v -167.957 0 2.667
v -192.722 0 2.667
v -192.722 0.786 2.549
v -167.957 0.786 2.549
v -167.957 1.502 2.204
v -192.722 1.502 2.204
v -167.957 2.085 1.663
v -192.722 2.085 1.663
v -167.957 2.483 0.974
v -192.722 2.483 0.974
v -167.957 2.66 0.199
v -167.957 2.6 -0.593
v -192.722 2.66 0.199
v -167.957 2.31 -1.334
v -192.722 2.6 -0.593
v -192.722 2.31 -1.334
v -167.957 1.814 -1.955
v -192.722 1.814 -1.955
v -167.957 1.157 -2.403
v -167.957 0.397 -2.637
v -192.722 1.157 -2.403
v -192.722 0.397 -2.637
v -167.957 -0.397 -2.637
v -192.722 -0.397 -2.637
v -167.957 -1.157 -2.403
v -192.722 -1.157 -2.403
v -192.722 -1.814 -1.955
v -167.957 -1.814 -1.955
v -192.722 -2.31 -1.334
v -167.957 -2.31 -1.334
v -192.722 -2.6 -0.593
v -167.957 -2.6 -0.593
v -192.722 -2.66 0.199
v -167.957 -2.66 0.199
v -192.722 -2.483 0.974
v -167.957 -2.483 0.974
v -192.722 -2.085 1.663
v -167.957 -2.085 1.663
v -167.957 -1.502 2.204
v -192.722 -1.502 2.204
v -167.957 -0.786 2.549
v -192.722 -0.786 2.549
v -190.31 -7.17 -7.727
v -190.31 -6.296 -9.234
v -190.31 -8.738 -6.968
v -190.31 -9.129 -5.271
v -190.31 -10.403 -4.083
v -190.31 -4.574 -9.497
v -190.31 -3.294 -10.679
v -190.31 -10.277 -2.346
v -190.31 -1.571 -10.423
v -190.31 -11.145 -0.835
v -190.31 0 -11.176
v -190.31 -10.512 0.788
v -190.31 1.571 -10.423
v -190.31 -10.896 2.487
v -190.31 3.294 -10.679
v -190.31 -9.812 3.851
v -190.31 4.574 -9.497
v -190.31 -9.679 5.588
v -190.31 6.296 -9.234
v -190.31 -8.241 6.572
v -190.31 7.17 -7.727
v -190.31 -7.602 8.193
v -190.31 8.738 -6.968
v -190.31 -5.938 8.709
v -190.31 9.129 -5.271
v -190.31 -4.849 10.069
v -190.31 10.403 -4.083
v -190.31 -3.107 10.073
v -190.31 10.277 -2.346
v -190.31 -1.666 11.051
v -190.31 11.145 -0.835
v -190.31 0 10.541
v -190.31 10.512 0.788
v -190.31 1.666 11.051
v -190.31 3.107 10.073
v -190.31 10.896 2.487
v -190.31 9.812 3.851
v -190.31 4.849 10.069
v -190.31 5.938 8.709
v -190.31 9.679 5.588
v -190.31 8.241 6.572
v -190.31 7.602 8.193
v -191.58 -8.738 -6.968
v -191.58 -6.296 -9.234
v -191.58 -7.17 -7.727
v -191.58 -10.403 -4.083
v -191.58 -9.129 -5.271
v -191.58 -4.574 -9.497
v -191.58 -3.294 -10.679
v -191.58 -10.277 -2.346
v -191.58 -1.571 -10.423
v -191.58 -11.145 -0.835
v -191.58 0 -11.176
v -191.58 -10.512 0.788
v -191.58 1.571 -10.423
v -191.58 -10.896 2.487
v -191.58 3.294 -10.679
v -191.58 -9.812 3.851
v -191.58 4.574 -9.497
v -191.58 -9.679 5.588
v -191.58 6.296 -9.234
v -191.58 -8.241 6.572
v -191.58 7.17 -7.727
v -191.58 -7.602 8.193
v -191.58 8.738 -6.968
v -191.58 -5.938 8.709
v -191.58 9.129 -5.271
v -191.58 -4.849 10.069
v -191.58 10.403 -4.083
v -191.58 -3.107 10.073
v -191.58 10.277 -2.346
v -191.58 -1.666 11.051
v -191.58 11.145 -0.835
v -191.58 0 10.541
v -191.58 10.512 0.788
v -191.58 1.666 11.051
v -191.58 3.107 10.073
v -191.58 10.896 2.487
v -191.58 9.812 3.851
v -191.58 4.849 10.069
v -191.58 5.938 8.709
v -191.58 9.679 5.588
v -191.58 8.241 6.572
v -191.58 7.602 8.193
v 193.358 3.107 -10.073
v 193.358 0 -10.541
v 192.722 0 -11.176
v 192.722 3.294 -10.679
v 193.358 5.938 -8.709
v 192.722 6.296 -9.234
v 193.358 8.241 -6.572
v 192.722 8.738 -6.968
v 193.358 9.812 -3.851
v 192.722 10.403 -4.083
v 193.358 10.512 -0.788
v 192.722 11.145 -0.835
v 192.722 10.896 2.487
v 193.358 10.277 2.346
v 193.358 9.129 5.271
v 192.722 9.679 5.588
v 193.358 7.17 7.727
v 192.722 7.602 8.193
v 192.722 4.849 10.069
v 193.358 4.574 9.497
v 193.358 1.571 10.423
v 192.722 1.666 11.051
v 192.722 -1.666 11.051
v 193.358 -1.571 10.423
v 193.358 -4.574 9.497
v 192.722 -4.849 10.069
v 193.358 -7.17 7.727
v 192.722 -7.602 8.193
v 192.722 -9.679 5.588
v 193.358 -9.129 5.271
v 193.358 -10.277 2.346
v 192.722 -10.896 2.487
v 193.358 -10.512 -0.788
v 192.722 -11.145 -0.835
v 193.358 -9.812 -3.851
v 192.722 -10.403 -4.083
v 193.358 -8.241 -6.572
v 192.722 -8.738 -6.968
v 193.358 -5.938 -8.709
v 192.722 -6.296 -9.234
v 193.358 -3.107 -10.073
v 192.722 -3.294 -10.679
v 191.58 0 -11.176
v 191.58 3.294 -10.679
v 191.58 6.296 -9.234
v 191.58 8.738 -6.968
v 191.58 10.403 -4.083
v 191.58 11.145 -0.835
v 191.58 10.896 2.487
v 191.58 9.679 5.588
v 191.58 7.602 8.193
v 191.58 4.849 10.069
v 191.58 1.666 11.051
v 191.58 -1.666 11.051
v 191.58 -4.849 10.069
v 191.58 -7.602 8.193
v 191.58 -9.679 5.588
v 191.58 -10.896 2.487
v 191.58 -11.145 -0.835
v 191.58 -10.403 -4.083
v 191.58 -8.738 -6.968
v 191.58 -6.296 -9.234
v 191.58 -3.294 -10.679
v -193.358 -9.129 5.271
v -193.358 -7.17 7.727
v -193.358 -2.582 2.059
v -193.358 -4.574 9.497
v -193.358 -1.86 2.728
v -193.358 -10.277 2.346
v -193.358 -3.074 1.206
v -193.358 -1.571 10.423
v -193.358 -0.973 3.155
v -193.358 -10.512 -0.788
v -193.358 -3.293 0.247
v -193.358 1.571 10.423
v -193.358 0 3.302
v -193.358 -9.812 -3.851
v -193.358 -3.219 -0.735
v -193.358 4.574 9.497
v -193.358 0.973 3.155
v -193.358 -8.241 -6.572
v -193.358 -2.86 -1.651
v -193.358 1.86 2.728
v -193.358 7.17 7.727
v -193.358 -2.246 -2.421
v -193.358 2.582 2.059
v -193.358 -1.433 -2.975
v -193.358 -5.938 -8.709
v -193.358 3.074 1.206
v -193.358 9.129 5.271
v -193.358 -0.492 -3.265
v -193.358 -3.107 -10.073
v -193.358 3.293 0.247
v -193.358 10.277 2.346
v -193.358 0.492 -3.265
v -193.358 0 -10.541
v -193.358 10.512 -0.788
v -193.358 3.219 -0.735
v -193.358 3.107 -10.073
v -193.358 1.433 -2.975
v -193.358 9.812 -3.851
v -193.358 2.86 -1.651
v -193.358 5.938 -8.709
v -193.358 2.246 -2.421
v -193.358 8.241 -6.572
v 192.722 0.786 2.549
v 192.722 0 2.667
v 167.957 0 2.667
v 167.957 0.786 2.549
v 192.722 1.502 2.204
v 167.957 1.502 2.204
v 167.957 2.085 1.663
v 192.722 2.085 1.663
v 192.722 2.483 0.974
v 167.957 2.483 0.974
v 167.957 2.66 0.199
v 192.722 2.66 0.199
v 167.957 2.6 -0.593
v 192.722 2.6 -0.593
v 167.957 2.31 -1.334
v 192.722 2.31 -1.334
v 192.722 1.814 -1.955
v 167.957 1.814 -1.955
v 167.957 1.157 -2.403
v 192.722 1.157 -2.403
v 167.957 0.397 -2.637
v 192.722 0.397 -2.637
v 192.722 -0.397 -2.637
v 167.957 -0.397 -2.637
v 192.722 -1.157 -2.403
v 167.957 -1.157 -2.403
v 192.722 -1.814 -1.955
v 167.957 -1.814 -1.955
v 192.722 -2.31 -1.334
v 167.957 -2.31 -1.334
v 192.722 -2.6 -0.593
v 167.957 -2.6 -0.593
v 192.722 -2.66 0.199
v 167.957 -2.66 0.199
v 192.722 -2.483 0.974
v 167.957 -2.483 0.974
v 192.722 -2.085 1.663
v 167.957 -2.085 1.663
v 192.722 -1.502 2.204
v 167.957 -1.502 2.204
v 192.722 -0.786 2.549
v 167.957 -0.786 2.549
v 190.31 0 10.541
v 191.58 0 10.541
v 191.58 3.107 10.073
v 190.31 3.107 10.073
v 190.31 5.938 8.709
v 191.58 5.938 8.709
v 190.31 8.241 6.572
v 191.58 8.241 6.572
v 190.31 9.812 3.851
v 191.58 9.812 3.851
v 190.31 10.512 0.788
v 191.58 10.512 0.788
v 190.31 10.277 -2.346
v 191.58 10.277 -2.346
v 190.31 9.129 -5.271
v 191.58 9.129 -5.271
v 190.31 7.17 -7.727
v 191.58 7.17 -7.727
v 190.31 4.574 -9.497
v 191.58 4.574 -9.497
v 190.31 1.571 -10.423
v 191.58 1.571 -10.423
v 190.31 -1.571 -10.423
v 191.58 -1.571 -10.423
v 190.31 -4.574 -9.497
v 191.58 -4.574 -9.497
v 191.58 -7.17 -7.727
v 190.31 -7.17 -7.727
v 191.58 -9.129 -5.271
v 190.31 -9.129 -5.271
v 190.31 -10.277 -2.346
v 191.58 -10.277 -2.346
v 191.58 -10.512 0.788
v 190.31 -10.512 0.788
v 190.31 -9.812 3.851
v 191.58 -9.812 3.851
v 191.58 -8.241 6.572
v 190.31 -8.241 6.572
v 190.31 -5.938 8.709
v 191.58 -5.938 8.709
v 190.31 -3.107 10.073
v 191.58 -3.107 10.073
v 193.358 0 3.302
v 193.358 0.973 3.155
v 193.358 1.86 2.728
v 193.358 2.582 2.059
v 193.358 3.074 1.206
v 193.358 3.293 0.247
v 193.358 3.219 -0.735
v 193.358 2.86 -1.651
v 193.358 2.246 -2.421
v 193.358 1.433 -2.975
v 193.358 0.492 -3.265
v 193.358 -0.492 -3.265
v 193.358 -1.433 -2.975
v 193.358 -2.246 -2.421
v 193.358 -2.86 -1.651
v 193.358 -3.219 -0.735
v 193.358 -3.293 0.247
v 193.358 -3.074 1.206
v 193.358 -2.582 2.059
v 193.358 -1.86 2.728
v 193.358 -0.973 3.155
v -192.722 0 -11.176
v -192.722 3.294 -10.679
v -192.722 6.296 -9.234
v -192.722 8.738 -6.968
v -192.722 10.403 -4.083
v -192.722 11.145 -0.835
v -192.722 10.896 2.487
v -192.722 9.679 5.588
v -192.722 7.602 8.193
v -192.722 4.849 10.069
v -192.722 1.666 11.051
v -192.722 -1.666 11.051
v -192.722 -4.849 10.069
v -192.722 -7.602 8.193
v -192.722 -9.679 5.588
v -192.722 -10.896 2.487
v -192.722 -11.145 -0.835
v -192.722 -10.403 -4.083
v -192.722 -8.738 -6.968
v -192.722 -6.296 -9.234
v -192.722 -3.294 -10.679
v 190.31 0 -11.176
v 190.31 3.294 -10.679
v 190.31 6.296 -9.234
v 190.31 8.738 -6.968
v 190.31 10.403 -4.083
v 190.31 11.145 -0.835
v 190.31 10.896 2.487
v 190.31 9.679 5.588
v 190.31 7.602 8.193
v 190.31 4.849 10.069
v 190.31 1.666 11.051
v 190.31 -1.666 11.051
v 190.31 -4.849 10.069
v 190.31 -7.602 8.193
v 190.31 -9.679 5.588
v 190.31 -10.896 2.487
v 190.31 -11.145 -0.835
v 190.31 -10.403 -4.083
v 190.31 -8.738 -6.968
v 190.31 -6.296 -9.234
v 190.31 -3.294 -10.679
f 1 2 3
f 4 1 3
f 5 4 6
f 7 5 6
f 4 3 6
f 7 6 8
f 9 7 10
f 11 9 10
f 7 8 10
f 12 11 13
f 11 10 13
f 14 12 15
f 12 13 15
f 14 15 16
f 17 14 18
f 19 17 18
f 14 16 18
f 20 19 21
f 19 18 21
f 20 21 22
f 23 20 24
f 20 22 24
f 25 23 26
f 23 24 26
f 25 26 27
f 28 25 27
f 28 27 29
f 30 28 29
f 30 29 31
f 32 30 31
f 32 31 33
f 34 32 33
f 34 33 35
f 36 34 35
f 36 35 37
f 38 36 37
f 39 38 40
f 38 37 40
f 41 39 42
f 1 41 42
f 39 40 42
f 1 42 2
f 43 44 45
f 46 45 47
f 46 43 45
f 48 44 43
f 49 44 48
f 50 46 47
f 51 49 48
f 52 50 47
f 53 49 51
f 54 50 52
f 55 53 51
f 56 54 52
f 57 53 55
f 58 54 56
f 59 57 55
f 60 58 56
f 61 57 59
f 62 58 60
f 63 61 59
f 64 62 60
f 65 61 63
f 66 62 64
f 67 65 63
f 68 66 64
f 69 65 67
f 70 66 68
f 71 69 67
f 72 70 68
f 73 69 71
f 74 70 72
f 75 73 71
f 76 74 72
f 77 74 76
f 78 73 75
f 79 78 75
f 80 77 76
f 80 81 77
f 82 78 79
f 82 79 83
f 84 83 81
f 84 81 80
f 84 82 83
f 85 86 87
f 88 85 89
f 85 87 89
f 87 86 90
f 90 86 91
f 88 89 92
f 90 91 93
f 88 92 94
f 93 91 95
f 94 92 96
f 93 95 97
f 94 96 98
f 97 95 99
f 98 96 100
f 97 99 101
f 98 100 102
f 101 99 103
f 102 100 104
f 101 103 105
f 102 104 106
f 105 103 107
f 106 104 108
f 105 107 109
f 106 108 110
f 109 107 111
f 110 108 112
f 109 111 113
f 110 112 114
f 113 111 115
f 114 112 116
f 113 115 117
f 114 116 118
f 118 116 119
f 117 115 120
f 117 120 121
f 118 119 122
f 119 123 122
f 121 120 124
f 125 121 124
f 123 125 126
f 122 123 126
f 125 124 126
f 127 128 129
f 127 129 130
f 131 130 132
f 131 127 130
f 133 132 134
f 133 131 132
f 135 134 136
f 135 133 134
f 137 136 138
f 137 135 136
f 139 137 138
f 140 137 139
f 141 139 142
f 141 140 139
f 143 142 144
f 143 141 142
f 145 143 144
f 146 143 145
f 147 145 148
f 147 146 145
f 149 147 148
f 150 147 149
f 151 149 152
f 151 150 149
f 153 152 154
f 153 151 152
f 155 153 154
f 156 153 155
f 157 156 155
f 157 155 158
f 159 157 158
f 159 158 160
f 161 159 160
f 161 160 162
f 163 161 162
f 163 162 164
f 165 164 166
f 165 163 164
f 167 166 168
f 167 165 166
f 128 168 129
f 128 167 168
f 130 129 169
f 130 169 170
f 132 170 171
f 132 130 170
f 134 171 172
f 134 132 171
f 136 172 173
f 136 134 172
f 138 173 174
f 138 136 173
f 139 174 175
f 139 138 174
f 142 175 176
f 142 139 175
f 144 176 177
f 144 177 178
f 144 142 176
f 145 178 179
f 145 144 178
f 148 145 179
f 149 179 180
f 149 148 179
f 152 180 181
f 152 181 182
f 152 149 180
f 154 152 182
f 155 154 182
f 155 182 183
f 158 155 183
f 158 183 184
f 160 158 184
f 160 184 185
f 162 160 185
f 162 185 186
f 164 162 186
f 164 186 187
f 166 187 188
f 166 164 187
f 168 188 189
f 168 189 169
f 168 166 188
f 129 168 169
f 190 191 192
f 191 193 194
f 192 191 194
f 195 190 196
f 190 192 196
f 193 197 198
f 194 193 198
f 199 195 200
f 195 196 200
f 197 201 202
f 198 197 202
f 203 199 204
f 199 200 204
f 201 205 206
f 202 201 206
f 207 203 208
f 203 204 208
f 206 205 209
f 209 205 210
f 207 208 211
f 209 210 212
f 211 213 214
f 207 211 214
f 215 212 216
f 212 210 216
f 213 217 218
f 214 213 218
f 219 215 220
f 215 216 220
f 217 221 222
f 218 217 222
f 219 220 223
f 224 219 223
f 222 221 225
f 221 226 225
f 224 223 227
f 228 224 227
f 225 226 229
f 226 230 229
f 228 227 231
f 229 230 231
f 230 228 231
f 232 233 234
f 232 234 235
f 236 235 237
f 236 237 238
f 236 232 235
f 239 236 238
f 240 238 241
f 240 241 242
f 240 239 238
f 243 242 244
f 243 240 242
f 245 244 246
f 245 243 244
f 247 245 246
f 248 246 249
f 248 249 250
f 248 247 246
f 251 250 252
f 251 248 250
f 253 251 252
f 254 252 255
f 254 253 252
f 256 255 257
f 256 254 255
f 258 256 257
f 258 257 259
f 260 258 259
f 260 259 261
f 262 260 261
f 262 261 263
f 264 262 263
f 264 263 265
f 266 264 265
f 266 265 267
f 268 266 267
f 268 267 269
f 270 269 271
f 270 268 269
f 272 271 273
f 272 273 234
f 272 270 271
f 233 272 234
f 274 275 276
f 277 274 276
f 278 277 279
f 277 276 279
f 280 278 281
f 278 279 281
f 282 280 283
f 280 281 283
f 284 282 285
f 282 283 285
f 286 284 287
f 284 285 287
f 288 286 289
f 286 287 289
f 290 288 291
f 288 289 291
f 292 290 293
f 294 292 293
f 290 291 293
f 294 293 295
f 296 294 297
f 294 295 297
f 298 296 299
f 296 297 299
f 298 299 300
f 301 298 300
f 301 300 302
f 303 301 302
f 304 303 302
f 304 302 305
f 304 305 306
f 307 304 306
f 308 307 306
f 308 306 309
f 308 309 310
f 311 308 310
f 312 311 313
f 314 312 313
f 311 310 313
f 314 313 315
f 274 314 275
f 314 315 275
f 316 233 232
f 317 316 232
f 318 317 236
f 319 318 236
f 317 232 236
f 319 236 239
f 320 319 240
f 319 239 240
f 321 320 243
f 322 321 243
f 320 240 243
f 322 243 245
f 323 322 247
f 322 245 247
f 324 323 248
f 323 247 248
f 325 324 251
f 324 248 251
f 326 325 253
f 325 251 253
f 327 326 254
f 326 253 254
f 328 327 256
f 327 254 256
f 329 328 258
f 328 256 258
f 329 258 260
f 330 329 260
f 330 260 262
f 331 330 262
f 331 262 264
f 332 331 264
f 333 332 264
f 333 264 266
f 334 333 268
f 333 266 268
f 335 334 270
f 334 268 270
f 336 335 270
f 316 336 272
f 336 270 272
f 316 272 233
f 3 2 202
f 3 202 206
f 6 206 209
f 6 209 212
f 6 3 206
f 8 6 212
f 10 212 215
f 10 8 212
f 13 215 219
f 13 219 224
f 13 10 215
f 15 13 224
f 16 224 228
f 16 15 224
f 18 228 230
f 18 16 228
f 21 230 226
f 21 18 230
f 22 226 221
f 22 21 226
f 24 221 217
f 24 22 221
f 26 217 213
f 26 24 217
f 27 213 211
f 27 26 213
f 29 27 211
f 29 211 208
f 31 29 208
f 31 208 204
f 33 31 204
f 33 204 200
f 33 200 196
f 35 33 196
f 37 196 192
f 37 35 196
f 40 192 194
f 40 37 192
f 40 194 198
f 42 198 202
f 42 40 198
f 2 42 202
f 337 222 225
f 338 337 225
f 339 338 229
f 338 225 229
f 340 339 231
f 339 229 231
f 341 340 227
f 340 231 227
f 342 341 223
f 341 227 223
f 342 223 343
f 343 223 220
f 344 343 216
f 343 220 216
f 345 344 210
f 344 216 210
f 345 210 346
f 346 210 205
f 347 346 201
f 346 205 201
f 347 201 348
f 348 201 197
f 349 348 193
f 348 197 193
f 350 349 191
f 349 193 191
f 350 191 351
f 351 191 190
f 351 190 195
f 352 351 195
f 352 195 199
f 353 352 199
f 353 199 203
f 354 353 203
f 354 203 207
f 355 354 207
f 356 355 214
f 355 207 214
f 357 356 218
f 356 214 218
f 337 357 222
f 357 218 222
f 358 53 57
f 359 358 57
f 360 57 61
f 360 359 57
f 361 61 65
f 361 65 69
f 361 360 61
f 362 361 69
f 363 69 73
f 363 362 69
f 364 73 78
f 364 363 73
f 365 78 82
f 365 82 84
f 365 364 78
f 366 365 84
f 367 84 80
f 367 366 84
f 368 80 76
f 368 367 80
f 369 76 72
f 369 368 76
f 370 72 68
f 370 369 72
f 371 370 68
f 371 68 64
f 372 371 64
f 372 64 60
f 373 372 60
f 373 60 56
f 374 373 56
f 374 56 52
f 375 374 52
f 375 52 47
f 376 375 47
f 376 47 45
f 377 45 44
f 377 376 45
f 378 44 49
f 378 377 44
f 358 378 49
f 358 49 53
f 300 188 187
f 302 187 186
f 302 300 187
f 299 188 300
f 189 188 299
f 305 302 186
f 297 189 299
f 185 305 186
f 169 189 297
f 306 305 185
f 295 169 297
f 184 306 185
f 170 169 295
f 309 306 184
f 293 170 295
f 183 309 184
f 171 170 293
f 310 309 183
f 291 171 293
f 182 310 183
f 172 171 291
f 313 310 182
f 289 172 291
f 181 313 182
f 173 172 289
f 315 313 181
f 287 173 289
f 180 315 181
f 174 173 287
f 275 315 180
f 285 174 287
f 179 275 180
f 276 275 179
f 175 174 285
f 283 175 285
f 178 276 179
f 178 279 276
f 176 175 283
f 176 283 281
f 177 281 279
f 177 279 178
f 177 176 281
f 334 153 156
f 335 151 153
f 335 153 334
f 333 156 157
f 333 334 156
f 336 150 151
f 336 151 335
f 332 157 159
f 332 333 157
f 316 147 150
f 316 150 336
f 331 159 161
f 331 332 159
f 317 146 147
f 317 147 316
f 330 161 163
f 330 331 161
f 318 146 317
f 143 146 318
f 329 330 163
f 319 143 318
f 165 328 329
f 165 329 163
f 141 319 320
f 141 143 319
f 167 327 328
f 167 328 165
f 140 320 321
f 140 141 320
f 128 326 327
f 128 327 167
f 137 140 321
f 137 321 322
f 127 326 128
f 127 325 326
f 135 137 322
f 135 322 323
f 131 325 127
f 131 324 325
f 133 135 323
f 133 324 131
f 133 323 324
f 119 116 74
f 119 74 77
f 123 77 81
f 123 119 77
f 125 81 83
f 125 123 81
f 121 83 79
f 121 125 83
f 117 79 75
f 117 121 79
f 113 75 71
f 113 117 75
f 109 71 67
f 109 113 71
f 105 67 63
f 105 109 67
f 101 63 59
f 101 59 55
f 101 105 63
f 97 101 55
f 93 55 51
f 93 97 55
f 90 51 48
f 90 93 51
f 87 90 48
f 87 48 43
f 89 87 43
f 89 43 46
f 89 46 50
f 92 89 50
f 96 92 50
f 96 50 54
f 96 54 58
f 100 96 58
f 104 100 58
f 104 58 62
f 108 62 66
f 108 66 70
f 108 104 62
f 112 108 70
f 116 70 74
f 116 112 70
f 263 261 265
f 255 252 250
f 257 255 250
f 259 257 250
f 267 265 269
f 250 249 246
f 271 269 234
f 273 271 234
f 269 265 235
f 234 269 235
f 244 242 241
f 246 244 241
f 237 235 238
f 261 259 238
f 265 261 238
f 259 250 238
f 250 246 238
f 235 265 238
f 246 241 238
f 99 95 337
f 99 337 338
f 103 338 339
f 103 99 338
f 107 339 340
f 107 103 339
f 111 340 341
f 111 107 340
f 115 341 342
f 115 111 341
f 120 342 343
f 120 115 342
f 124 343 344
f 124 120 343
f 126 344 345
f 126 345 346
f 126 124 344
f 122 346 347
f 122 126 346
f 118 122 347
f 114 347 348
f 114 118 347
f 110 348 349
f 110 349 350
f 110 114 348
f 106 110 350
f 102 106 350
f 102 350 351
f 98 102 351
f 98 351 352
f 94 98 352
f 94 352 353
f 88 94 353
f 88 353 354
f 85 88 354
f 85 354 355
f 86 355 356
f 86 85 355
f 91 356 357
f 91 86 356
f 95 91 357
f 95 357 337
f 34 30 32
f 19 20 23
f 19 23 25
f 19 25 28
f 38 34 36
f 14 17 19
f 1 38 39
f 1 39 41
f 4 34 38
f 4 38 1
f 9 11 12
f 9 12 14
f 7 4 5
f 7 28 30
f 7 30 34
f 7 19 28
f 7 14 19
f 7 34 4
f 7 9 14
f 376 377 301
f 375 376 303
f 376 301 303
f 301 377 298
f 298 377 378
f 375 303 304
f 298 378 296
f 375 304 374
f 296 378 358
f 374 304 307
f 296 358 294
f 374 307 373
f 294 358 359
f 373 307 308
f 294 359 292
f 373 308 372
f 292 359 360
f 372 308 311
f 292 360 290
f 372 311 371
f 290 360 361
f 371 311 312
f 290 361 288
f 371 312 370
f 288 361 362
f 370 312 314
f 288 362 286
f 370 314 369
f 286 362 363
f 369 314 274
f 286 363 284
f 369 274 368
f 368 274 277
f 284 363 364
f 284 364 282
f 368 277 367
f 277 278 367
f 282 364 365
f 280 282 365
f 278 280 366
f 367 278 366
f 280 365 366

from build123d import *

# Parameters (mm, degrees)
SKETCH1_R           = 11.176
BOSS_EXTRUDE1_DEPTH = 193.3575
CUT_EXTRUDE1_START  = -1.778
SKETCH2_OUTSIDE_W   = 101.952
SKETCH2_OUTSIDE_H   = 101.952
SKETCH2_OUTSIDE_R   = 10.541
CUT_EXTRUDE1_DEPTH  = 1.27
SKETCH3_R           = 2.667
CUT_EXTRUDE2_DEPTH  = 25.4
CHAMFER1_SIZE       = 0.635


with BuildPart() as part:
    # Sketch1 → Boss-Extrude1 (new, symmetric)
    with BuildSketch(Plane(origin=(0, 0, 0), x_dir=(0, 0, -1), z_dir=(1, 0, 0))):
        Circle(SKETCH1_R)
    extrude(amount=BOSS_EXTRUDE1_DEPTH, both=True)

    # Sketch2 outside → Cut-Extrude1 (cut)
    with BuildSketch(Plane.ZY.offset(193.3575).offset(CUT_EXTRUDE1_START)):
        Rectangle(SKETCH2_OUTSIDE_W, SKETCH2_OUTSIDE_H)
        Circle(SKETCH2_OUTSIDE_R, mode=Mode.SUBTRACT)
    cut_extrude1 = extrude(amount=-CUT_EXTRUDE1_DEPTH, mode=Mode.SUBTRACT)

    # Sketch3 → Cut-Extrude2 (cut)
    with BuildSketch(Plane.ZY.offset(193.3575)):
        Circle(SKETCH3_R)
    cut_extrude2 = extrude(amount=-CUT_EXTRUDE2_DEPTH, mode=Mode.SUBTRACT)

    # Mirror1: Cut-Extrude1, Cut-Extrude2 across plane
    add(cut_extrude1.mirror(Plane(origin=(0, 0, 0), x_dir=(0, 0, 1), z_dir=(1, 0, 0))), mode=Mode.SUBTRACT)
    add(cut_extrude2.mirror(Plane(origin=(0, 0, 0), x_dir=(0, 0, 1), z_dir=(1, 0, 0))), mode=Mode.SUBTRACT)

    # Chamfer1
    chamfer1_edges = [part.edges().sort_by_distance(p)[0] for p in [
        (-193.3575, 0, 11.176),
        (-193.3575, 0, -2.667),
        (193.3575, 0, 11.176),
        (193.3575, 0, -2.667),
    ]]
    chamfer(chamfer1_edges, length=CHAMFER1_SIZE)


solid = part.part
